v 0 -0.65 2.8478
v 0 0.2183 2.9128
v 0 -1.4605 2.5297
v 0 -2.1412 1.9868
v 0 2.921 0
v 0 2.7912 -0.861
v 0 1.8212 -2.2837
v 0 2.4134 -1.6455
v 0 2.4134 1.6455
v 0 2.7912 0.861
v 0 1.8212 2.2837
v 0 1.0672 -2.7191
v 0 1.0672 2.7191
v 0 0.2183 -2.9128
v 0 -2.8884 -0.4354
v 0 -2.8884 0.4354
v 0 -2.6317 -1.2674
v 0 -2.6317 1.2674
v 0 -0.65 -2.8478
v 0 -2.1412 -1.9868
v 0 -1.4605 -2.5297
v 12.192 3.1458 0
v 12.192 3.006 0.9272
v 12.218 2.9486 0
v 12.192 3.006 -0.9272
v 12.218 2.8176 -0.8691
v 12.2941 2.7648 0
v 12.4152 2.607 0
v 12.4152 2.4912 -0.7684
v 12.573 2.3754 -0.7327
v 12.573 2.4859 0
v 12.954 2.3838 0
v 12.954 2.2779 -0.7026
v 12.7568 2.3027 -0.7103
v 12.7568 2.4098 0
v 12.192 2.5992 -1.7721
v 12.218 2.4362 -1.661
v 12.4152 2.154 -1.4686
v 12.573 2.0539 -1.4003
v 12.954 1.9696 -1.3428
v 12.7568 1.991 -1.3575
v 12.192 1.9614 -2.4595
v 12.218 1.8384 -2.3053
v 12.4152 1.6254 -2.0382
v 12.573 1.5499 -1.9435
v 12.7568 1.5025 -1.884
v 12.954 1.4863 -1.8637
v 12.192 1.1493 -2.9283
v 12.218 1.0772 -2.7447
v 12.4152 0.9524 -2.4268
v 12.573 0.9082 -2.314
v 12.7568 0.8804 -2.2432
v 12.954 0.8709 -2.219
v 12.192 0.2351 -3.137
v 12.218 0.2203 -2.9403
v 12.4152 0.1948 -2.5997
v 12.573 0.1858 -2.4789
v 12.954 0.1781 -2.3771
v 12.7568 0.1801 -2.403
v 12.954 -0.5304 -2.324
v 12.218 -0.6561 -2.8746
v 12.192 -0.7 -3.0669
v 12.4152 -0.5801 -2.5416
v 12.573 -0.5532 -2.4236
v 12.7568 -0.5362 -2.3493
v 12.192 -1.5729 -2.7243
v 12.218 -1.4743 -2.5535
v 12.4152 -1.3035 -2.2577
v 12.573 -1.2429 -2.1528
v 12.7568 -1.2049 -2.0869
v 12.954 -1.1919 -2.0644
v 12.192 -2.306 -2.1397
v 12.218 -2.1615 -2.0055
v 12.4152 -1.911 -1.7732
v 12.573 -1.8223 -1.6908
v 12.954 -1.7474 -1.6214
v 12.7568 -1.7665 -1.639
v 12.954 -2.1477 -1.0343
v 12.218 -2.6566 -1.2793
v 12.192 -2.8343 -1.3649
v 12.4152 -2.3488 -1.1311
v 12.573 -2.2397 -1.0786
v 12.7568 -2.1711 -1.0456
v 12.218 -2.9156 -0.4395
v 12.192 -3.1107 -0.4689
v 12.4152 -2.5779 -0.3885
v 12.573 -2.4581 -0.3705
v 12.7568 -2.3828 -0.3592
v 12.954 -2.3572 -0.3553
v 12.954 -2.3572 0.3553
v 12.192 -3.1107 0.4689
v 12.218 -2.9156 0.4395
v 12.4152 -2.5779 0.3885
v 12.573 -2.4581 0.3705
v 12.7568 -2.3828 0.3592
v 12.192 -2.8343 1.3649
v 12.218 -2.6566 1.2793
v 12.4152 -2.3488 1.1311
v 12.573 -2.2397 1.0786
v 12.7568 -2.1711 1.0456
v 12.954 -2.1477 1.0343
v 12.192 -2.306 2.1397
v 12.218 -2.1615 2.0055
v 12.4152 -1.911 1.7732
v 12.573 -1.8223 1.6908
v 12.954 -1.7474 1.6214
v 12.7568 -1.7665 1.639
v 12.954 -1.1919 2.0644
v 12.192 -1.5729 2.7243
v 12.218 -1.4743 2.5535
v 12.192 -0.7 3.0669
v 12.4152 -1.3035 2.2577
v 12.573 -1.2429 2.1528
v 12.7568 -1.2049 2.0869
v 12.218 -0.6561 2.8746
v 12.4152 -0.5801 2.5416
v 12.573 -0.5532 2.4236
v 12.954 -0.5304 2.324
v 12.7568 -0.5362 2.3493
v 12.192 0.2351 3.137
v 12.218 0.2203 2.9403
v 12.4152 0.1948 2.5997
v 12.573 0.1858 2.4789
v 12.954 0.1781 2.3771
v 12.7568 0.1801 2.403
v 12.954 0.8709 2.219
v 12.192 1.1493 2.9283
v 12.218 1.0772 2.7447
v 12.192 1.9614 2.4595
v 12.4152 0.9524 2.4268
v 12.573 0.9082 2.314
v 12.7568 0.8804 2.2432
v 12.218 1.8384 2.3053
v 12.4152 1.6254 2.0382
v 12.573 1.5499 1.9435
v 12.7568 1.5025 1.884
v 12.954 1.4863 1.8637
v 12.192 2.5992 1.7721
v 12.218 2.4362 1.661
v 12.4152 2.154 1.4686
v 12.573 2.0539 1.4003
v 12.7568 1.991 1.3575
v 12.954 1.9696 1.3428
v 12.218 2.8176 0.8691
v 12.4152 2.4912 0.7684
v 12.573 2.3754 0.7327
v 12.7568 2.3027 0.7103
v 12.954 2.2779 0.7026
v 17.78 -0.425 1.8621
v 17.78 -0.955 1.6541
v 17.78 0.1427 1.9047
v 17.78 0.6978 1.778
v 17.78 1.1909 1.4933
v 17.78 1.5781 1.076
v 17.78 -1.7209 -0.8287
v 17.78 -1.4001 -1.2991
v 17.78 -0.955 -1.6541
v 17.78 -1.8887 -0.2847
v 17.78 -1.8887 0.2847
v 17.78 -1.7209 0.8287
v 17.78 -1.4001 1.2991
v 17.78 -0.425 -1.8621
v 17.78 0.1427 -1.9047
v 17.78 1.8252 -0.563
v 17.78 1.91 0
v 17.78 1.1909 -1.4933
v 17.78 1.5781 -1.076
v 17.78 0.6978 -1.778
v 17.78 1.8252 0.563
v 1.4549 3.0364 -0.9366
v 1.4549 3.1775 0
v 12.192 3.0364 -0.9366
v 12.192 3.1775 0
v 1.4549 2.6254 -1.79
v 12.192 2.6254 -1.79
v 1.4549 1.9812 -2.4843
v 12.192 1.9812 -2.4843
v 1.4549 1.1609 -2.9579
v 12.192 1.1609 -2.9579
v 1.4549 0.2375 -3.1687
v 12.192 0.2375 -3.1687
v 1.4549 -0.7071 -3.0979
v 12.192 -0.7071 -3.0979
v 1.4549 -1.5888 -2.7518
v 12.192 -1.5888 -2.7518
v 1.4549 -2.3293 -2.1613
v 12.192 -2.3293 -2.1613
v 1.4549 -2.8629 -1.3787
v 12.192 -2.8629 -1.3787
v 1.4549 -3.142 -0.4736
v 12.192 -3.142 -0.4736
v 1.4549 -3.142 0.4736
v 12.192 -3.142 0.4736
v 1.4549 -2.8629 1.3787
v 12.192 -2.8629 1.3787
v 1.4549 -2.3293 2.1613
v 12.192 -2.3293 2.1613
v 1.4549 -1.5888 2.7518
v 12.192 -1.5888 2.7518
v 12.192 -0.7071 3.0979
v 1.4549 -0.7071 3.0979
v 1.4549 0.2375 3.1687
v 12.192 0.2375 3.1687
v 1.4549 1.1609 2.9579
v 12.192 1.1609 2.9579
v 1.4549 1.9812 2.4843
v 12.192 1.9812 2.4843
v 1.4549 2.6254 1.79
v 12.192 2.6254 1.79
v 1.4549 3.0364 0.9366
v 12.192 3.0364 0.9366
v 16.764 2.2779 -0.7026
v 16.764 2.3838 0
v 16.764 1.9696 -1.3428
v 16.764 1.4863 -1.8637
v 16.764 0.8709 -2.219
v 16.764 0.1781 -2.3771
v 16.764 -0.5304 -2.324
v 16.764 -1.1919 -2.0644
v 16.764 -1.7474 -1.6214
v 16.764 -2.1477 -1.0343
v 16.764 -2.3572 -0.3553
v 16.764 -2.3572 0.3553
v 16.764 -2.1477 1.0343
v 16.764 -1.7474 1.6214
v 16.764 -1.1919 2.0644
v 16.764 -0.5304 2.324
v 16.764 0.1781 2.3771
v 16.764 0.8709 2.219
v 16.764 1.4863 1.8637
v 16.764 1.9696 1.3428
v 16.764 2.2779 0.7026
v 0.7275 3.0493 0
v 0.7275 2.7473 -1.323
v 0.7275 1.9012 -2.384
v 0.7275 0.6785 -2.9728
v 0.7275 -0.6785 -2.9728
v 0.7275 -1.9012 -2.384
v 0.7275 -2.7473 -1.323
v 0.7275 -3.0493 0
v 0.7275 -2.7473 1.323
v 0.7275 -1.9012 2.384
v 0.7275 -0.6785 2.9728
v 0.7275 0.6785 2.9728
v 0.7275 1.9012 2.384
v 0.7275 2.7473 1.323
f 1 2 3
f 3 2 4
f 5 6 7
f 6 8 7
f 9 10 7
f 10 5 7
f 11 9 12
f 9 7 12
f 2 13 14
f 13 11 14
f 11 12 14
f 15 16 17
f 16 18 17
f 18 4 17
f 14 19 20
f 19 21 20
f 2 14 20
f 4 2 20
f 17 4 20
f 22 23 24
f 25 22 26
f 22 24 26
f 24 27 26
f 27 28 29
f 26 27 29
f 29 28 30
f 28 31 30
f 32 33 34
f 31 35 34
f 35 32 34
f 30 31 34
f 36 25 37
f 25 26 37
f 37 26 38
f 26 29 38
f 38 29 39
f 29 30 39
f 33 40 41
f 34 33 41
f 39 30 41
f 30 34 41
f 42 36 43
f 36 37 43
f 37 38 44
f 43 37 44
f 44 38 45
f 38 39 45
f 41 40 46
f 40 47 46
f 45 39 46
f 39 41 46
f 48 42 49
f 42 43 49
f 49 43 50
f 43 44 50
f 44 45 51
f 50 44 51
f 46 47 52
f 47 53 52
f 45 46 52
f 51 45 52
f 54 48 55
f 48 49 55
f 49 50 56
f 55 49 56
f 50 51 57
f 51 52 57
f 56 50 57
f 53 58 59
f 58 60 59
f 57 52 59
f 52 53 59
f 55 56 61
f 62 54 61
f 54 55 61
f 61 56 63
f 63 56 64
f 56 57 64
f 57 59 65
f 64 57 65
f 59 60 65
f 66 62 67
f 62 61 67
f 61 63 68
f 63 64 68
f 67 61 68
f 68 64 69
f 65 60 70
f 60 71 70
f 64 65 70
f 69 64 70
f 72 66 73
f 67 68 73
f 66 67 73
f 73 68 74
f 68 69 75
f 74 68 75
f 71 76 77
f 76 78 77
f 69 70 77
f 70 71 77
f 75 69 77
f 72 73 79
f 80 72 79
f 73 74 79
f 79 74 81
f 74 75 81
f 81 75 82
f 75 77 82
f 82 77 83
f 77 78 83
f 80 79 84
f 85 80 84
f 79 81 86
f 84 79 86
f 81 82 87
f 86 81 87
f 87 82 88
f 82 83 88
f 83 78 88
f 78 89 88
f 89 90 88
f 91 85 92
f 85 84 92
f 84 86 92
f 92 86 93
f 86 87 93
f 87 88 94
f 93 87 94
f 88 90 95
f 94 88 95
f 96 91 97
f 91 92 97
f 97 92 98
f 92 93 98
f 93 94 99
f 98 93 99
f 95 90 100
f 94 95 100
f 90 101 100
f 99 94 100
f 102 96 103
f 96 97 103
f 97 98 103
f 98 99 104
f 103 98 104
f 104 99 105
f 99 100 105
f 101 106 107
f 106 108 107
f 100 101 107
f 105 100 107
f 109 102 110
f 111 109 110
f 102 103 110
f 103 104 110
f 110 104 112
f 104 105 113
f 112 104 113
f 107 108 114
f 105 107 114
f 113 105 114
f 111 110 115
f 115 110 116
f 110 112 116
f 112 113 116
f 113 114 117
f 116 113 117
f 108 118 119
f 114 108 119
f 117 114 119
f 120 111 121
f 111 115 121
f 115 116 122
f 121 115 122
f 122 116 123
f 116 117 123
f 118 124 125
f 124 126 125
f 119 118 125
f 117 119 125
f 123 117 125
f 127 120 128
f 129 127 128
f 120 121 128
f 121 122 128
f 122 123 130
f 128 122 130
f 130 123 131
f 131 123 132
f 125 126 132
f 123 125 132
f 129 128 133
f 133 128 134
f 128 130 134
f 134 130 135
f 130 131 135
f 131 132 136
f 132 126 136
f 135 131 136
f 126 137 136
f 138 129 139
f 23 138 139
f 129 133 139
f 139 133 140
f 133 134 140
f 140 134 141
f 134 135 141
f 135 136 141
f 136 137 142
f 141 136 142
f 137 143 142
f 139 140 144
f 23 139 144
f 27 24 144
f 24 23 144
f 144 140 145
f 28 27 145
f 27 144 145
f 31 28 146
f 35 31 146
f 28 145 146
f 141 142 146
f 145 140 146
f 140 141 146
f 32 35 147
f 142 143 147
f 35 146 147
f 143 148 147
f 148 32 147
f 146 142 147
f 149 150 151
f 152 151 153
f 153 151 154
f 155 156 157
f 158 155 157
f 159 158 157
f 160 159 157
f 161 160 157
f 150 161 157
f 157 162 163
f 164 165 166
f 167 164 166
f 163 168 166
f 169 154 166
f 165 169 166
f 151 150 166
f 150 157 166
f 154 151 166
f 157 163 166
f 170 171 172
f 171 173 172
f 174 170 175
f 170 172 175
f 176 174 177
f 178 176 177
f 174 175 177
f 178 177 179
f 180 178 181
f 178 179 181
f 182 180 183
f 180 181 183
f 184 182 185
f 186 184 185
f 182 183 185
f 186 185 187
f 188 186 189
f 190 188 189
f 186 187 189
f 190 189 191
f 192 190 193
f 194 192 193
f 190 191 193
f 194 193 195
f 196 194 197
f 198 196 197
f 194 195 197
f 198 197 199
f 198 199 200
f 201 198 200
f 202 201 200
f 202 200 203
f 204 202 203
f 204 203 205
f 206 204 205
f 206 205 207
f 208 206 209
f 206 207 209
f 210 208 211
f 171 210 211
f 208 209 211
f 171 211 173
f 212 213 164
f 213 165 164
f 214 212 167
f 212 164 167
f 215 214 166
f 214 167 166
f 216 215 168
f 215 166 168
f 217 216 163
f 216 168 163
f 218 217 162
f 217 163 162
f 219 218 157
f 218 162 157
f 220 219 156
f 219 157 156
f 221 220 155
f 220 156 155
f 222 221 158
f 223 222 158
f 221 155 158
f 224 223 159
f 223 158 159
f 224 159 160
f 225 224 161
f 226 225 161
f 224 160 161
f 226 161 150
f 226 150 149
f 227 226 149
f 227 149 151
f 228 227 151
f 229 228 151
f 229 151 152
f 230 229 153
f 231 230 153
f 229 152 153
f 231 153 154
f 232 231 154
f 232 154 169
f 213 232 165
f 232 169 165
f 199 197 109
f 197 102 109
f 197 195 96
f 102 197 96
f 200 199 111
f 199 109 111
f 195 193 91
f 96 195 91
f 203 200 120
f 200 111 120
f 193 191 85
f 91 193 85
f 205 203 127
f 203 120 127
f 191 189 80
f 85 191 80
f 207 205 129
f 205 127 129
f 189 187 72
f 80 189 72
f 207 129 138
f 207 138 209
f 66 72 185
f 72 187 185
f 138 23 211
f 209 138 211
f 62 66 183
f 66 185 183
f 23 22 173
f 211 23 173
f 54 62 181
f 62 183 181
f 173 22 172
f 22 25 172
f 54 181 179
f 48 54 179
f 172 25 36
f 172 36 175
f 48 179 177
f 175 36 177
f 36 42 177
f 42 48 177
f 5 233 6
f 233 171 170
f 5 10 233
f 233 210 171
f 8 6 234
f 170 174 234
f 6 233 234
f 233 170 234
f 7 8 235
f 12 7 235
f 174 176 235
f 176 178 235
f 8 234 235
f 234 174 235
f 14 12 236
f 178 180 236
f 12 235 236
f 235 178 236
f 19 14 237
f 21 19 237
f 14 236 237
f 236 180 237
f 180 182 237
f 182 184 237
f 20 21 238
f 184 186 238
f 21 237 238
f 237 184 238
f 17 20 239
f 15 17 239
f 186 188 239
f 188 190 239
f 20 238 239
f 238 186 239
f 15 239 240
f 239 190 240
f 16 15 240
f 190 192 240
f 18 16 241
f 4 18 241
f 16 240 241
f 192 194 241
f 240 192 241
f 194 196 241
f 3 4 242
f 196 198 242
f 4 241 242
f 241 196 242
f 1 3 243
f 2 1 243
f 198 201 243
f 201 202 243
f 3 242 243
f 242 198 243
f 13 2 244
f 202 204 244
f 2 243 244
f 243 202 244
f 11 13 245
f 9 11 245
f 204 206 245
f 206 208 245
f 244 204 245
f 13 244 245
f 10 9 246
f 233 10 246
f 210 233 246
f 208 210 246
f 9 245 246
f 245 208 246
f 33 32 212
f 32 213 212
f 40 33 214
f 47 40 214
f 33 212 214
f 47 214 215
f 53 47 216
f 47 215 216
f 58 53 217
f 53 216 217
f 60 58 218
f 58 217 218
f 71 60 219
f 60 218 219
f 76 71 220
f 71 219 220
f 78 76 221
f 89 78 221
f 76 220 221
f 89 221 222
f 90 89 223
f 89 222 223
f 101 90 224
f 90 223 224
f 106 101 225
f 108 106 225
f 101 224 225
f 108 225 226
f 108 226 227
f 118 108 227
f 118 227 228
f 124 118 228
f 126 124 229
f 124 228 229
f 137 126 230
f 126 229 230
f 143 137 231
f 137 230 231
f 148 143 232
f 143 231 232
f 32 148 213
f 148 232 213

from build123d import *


with BuildPart() as part:
    # Sketch1 → Revolve1 (revolve)
    with BuildSketch(Plane.XY, mode=Mode.PRIVATE) as revolve1_sk:
        with BuildLine():
            Line((12.192, -3.17754), (12.192, -3.14579))
            ThreePointArc((12.192, -3.14579), (12.415184633, -2.606974633), (12.954, -2.38379))
            Line((12.954, -2.38379), (16.764, -2.38379))
            Line((16.764, -2.38379), (17.78, -1.910021419))
            Line((17.78, -1.910021419), (17.78, 0))
            Line((17.78, 0), (8.89, 0))
            Line((8.89, 0), (0, 0))
            Line((0, 0), (0, -2.921))
            Line((0, -2.921), (1.454910638, -3.17754))
            Line((1.454910638, -3.17754), (12.192, -3.17754))
        make_face()
    revolve(revolve1_sk.sketch.rotate(Axis((0, 0, 0), (-1, 0, 0)), 180), axis=Axis((0, 0, 0), (-1, 0, 0)))  # turned: the seam where the file's is


solid = part.part
